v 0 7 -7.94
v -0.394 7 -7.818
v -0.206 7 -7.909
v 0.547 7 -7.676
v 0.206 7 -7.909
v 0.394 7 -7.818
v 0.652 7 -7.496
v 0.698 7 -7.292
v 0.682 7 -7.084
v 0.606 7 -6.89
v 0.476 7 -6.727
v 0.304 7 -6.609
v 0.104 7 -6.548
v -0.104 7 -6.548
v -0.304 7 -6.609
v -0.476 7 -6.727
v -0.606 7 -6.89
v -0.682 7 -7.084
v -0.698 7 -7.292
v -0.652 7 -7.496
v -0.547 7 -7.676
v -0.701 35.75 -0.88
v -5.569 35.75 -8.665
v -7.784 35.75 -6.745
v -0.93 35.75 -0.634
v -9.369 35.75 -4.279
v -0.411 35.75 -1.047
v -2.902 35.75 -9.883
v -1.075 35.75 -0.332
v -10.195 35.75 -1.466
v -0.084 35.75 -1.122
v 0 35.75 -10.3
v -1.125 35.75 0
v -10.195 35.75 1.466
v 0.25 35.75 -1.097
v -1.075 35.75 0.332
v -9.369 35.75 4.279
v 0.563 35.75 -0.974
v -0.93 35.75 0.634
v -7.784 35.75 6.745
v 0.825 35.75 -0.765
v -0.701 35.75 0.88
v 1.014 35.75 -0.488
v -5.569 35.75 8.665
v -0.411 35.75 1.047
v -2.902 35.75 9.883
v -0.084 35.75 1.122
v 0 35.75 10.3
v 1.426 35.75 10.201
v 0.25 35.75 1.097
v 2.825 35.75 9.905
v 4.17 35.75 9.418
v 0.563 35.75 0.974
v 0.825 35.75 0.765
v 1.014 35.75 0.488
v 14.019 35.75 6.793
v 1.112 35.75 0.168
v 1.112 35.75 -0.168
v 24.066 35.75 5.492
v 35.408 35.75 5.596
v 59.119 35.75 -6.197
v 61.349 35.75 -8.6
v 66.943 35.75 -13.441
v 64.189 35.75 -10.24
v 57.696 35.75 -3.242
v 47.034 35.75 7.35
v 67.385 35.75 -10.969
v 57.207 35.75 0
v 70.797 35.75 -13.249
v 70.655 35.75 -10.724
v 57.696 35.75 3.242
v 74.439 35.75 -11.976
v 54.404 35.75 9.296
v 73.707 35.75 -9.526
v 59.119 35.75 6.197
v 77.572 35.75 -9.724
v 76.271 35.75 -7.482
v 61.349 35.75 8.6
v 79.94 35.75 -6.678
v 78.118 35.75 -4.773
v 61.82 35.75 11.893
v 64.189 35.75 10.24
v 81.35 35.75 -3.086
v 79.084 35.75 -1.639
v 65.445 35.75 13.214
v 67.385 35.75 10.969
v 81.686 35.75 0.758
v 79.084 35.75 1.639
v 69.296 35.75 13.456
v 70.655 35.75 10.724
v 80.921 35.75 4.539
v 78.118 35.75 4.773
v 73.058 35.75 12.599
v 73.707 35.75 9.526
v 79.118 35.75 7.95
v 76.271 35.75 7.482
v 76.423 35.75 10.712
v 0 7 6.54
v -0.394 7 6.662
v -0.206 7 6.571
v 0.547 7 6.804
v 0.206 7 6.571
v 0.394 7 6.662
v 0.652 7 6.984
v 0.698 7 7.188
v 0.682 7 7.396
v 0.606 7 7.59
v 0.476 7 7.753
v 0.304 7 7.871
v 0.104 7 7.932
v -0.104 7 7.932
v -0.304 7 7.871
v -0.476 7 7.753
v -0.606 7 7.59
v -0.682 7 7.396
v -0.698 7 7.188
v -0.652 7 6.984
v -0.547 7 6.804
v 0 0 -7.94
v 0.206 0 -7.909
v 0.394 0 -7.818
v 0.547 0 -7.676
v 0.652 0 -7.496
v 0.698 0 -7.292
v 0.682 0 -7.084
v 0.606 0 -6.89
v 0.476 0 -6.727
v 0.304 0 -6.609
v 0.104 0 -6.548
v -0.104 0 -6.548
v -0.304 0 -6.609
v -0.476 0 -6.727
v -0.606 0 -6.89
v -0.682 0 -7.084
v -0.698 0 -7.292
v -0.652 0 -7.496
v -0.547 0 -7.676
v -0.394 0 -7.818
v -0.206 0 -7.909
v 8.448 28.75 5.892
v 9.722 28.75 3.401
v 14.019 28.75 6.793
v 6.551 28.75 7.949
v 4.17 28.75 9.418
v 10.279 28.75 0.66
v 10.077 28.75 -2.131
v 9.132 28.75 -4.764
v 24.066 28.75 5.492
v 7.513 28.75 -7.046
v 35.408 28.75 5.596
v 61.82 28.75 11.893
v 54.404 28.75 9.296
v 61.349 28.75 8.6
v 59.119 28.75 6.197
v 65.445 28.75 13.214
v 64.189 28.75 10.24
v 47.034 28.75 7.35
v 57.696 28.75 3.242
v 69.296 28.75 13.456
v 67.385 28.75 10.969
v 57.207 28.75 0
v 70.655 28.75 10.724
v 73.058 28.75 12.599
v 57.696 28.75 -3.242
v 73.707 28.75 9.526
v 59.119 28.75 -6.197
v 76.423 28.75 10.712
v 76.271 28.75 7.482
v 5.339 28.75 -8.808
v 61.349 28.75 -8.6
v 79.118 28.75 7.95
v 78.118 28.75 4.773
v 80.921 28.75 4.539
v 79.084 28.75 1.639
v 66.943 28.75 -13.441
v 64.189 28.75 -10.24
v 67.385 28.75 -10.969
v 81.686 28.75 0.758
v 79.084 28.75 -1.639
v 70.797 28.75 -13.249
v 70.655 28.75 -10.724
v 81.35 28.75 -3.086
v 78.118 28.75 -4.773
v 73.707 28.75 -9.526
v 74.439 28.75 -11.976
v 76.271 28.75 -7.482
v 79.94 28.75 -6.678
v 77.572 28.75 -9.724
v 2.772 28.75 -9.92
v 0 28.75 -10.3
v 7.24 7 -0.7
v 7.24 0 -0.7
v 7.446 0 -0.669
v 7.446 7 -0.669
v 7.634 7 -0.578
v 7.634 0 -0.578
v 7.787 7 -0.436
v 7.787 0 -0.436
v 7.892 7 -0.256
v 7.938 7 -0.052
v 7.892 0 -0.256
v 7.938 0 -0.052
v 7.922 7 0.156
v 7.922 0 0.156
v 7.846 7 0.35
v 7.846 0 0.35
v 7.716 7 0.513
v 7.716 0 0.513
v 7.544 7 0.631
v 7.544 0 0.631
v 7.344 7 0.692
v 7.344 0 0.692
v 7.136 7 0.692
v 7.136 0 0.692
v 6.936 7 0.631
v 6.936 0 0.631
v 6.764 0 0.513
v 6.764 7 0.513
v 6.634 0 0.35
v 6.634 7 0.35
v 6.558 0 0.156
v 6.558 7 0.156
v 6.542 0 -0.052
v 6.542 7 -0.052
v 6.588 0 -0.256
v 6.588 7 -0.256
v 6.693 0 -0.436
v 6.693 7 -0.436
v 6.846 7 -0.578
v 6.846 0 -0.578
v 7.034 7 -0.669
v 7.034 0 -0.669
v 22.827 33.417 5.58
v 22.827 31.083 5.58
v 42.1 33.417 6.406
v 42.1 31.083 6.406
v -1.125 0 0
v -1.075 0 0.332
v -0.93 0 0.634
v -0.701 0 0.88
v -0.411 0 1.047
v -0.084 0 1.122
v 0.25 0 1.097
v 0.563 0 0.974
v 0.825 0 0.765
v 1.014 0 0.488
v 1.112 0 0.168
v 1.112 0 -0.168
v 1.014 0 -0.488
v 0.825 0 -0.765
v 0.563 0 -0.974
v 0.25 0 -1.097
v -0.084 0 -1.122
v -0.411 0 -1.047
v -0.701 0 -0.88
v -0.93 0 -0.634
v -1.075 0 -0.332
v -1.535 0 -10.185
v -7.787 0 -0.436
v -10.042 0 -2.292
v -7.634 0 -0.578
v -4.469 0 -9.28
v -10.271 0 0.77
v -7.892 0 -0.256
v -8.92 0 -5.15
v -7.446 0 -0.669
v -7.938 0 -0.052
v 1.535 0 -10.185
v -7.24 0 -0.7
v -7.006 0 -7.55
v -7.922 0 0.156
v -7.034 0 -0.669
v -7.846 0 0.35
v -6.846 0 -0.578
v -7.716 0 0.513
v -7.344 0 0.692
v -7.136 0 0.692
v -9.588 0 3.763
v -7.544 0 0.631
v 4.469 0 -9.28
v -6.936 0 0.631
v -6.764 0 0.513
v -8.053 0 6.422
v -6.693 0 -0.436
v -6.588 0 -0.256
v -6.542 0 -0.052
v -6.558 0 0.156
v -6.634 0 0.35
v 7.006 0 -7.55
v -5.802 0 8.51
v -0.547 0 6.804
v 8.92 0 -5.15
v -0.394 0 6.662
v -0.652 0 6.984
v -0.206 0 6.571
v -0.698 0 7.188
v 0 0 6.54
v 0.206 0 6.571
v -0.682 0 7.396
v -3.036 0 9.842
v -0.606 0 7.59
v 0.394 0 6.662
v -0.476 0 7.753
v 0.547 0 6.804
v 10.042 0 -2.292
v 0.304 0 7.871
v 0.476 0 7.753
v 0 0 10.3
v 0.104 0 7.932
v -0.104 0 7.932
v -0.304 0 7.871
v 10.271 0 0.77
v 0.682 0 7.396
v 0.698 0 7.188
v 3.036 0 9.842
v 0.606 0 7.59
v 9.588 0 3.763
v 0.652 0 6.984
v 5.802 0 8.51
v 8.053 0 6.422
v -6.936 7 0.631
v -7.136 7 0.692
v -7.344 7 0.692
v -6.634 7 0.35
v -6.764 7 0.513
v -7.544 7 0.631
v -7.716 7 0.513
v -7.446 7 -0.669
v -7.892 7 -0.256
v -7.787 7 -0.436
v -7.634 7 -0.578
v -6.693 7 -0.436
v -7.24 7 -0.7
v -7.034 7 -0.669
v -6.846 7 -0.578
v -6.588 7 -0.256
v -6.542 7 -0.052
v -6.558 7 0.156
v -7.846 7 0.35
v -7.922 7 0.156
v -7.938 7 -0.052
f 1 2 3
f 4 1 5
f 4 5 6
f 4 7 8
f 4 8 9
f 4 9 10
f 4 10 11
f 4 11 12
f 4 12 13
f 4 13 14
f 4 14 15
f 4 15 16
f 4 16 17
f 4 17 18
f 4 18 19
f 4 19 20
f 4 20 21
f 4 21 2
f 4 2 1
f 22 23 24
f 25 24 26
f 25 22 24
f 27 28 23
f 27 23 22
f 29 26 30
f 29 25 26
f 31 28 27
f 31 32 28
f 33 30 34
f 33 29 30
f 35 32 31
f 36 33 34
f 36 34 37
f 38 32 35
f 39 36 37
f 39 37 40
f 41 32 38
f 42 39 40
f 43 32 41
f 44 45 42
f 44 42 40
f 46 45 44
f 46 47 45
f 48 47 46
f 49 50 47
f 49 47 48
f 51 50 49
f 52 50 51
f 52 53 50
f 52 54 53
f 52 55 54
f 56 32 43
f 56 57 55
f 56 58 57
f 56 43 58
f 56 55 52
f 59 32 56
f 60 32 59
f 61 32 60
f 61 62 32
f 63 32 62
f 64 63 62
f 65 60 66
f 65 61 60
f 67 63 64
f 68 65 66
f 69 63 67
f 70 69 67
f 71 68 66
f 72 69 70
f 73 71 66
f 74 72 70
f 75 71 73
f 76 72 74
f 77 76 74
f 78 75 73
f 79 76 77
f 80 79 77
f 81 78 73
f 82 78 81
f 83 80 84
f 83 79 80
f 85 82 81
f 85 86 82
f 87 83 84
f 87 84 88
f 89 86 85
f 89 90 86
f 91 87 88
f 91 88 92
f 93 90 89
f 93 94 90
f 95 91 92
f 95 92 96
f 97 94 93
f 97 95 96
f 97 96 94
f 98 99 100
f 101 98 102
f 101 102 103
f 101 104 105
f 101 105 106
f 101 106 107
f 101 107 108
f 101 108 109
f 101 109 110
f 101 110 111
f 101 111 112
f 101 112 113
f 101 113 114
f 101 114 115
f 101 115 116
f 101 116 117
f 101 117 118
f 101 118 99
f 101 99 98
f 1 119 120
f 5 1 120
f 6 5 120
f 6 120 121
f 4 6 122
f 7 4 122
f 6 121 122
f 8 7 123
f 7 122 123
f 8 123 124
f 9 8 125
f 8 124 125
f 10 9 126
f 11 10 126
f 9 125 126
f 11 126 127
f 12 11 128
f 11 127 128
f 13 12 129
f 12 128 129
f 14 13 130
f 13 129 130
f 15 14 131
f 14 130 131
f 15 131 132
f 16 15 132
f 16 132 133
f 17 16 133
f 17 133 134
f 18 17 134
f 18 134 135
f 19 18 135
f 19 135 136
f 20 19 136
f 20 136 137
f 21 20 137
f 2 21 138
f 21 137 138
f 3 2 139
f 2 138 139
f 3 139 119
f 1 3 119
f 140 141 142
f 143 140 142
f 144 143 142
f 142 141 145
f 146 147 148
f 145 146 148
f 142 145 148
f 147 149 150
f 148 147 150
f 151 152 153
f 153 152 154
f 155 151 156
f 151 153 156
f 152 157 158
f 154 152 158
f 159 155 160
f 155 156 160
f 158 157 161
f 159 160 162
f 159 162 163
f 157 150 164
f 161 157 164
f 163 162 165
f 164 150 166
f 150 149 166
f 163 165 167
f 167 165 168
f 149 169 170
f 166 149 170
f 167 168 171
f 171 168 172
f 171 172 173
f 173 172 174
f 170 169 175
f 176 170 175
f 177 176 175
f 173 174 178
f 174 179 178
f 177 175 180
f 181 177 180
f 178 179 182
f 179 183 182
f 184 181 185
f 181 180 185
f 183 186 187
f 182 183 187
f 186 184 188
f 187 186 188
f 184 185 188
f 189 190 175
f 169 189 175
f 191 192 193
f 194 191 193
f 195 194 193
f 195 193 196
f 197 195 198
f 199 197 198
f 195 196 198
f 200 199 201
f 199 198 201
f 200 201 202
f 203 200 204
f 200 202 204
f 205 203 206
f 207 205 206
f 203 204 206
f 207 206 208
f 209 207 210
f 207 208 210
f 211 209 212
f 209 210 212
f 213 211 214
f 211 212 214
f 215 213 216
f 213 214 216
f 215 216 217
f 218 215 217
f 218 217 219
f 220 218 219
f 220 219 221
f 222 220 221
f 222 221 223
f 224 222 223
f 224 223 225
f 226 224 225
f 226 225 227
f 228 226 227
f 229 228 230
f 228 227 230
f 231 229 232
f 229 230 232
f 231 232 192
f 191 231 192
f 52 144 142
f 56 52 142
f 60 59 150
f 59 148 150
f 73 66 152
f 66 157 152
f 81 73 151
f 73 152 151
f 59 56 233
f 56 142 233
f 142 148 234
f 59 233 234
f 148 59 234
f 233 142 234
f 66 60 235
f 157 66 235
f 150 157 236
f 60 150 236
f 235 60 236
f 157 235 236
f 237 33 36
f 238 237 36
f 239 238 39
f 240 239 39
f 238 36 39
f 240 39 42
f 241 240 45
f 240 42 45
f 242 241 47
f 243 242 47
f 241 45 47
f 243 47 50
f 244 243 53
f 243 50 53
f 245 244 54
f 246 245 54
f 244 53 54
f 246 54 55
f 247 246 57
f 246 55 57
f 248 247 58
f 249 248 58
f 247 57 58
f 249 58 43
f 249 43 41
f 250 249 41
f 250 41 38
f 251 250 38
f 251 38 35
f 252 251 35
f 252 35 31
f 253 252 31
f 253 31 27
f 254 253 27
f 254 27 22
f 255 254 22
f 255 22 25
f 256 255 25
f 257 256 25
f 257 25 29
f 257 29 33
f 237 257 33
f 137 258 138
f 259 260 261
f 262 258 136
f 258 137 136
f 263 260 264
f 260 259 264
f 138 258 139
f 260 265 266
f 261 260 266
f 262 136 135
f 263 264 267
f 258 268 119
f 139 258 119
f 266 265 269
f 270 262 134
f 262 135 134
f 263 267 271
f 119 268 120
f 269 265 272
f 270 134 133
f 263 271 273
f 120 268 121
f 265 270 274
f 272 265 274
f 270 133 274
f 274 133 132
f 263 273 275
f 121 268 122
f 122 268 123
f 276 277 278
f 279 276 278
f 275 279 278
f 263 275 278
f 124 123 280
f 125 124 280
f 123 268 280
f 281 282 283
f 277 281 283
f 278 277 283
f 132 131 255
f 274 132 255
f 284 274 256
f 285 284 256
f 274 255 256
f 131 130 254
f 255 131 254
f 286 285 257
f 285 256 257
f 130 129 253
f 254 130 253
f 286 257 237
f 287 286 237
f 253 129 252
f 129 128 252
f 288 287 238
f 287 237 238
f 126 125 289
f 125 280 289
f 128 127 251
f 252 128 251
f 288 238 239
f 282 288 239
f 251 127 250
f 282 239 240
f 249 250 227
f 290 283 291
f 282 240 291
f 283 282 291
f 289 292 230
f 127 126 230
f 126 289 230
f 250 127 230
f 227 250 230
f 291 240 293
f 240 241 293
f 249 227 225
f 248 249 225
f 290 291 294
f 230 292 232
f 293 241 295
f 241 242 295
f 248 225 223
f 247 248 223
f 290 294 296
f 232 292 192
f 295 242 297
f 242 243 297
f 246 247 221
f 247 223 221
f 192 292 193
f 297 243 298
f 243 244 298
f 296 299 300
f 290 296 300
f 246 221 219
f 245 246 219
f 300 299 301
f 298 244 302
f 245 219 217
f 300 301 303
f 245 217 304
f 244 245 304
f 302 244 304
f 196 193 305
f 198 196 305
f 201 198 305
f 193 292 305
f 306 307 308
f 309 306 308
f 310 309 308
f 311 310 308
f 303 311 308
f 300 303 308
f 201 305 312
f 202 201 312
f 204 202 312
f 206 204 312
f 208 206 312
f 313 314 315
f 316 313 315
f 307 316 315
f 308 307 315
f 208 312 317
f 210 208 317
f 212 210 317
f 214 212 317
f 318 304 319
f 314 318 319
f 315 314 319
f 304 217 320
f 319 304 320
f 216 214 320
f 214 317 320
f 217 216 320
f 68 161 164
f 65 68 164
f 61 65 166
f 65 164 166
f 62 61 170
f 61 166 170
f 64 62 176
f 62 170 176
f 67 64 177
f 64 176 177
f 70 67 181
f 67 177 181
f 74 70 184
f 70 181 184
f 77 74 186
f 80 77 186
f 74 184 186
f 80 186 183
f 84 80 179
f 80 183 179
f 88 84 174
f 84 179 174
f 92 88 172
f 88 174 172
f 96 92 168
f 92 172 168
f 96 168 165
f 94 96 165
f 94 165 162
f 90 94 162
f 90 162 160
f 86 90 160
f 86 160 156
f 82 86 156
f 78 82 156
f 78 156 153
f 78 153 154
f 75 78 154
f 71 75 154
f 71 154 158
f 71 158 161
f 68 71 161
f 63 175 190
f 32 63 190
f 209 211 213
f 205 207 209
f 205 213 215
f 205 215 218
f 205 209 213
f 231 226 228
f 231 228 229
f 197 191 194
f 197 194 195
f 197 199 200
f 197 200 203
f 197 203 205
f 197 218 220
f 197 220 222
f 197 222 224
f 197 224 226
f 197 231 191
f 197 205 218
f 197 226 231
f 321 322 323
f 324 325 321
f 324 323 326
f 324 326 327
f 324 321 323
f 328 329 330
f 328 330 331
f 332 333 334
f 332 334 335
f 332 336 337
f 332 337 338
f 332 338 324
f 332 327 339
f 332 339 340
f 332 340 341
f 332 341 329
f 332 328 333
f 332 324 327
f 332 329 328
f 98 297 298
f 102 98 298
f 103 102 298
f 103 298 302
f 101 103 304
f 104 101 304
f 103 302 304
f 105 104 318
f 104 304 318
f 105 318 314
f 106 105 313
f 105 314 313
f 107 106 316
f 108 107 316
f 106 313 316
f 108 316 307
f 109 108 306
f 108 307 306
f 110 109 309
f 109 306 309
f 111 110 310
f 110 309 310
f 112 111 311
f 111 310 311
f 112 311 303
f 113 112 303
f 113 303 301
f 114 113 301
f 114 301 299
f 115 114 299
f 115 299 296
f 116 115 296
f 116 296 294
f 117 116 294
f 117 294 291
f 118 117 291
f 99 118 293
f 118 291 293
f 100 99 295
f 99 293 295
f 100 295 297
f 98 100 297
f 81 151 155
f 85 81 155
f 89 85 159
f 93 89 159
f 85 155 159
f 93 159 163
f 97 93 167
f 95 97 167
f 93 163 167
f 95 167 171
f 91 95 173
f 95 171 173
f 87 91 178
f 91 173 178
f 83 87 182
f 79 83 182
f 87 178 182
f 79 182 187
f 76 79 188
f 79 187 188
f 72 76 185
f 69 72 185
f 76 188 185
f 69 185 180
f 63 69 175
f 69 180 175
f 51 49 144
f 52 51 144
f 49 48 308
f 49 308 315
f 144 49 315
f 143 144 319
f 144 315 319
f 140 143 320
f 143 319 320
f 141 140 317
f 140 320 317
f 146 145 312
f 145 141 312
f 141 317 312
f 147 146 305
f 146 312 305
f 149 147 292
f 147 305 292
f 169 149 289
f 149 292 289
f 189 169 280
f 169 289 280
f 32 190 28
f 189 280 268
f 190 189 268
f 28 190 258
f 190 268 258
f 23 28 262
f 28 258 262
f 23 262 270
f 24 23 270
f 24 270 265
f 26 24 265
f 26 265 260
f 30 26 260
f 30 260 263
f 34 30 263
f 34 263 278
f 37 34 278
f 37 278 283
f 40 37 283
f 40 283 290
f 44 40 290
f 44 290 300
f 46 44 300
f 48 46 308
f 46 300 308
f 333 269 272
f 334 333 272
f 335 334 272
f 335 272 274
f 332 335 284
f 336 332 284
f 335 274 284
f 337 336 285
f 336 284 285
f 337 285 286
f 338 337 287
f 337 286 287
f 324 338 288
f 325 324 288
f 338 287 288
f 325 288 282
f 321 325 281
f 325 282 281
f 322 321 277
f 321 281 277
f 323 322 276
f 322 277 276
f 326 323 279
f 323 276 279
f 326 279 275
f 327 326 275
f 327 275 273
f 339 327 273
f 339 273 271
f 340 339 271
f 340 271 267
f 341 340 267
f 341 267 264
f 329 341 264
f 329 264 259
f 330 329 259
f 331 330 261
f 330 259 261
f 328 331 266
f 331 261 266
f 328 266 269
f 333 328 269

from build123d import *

# Parameters (mm, degrees)
SZKIC1_R                    = 10.3
DODANIE_WYCI_GNI_CIE1_DEPTH = 35.75
OTWORY_USTALAJ_CE_2_5MM2_D  = 2.25
DODANIE_WYCI_GNI_CIE3_START = -7
DODANIE_WYCI_GNI_CIE3_DEPTH = 7
OTWORY_USTALAJ_CE_2_5MM3_D  = 22
SZKIC12_R                   = 0.7
WYTNIJ_WYCI_GNI_CIE1_DEPTH  = 7


with BuildPart() as part:
    # Szkic1 → Dodanie-wyciągnięcie1 (new body)
    with BuildSketch(Plane(origin=(0, 0, 0), x_dir=(1, 0, 0), z_dir=(0, 1, 0))):
        Circle(SZKIC1_R)
    extrude(amount=DODANIE_WYCI_GNI_CIE1_DEPTH)

    # Otwory ustalające Ø2.5mm2 (through all)
    with Locations(Plane.XZ):
        with Locations((0, 0)):
            Hole(OTWORY_USTALAJ_CE_2_5MM2_D / 2)

    # Szkic7 → Dodanie-wyciągnięcie3 (add)
    with BuildSketch(Plane(origin=(0, 35.75, 0), x_dir=(1, 0, 0), z_dir=(0, 1, 0)).offset(DODANIE_WYCI_GNI_CIE3_START)):
        with BuildLine():
            Line((66.943357066, 13.440701035), (0, 10.3))
            ThreePointArc((0, 10.3), (10.077130906, 2.131063748), (4.169904535, -9.418168408))
            add(Edge.make_bspline(
                [(4.169904535, -9.418168408), (22.461776037, -3.24596138), (41.934151815, -4.077243057), (61.820006497, -11.893378905)],
                knots=[0, 0, 0, 0, 1, 1, 1, 1], degree=3))
            ThreePointArc((61.820006497, -11.893378905), (81.439431711, -2.675954354), (66.943357066, 13.440701035))
        make_face()
    extrude(amount=DODANIE_WYCI_GNI_CIE3_DEPTH)

    # Otwory ustalające Ø2.5mm3 (through all)
    with Locations(Plane(origin=(0, 35.75, 0), x_dir=(1, 0, 0), z_dir=(0, 1, 0))):
        with Locations((68.207301561, 0)):
            Hole(OTWORY_USTALAJ_CE_2_5MM3_D / 2)

    # Szkic12 → Wytnij-wyciągnięcie1 (cut)
    with BuildSketch(Plane.XZ):
        with Locations((7.24, 0)):
            Circle(SZKIC12_R)
        with Locations((-7.24, 0)):
            Circle(SZKIC12_R)
        with Locations((0, -7.24)):
            Circle(SZKIC12_R)
        with Locations((0, 7.24)):
            Circle(SZKIC12_R)
    extrude(amount=-WYTNIJ_WYCI_GNI_CIE1_DEPTH, mode=Mode.SUBTRACT)


solid = part.part
